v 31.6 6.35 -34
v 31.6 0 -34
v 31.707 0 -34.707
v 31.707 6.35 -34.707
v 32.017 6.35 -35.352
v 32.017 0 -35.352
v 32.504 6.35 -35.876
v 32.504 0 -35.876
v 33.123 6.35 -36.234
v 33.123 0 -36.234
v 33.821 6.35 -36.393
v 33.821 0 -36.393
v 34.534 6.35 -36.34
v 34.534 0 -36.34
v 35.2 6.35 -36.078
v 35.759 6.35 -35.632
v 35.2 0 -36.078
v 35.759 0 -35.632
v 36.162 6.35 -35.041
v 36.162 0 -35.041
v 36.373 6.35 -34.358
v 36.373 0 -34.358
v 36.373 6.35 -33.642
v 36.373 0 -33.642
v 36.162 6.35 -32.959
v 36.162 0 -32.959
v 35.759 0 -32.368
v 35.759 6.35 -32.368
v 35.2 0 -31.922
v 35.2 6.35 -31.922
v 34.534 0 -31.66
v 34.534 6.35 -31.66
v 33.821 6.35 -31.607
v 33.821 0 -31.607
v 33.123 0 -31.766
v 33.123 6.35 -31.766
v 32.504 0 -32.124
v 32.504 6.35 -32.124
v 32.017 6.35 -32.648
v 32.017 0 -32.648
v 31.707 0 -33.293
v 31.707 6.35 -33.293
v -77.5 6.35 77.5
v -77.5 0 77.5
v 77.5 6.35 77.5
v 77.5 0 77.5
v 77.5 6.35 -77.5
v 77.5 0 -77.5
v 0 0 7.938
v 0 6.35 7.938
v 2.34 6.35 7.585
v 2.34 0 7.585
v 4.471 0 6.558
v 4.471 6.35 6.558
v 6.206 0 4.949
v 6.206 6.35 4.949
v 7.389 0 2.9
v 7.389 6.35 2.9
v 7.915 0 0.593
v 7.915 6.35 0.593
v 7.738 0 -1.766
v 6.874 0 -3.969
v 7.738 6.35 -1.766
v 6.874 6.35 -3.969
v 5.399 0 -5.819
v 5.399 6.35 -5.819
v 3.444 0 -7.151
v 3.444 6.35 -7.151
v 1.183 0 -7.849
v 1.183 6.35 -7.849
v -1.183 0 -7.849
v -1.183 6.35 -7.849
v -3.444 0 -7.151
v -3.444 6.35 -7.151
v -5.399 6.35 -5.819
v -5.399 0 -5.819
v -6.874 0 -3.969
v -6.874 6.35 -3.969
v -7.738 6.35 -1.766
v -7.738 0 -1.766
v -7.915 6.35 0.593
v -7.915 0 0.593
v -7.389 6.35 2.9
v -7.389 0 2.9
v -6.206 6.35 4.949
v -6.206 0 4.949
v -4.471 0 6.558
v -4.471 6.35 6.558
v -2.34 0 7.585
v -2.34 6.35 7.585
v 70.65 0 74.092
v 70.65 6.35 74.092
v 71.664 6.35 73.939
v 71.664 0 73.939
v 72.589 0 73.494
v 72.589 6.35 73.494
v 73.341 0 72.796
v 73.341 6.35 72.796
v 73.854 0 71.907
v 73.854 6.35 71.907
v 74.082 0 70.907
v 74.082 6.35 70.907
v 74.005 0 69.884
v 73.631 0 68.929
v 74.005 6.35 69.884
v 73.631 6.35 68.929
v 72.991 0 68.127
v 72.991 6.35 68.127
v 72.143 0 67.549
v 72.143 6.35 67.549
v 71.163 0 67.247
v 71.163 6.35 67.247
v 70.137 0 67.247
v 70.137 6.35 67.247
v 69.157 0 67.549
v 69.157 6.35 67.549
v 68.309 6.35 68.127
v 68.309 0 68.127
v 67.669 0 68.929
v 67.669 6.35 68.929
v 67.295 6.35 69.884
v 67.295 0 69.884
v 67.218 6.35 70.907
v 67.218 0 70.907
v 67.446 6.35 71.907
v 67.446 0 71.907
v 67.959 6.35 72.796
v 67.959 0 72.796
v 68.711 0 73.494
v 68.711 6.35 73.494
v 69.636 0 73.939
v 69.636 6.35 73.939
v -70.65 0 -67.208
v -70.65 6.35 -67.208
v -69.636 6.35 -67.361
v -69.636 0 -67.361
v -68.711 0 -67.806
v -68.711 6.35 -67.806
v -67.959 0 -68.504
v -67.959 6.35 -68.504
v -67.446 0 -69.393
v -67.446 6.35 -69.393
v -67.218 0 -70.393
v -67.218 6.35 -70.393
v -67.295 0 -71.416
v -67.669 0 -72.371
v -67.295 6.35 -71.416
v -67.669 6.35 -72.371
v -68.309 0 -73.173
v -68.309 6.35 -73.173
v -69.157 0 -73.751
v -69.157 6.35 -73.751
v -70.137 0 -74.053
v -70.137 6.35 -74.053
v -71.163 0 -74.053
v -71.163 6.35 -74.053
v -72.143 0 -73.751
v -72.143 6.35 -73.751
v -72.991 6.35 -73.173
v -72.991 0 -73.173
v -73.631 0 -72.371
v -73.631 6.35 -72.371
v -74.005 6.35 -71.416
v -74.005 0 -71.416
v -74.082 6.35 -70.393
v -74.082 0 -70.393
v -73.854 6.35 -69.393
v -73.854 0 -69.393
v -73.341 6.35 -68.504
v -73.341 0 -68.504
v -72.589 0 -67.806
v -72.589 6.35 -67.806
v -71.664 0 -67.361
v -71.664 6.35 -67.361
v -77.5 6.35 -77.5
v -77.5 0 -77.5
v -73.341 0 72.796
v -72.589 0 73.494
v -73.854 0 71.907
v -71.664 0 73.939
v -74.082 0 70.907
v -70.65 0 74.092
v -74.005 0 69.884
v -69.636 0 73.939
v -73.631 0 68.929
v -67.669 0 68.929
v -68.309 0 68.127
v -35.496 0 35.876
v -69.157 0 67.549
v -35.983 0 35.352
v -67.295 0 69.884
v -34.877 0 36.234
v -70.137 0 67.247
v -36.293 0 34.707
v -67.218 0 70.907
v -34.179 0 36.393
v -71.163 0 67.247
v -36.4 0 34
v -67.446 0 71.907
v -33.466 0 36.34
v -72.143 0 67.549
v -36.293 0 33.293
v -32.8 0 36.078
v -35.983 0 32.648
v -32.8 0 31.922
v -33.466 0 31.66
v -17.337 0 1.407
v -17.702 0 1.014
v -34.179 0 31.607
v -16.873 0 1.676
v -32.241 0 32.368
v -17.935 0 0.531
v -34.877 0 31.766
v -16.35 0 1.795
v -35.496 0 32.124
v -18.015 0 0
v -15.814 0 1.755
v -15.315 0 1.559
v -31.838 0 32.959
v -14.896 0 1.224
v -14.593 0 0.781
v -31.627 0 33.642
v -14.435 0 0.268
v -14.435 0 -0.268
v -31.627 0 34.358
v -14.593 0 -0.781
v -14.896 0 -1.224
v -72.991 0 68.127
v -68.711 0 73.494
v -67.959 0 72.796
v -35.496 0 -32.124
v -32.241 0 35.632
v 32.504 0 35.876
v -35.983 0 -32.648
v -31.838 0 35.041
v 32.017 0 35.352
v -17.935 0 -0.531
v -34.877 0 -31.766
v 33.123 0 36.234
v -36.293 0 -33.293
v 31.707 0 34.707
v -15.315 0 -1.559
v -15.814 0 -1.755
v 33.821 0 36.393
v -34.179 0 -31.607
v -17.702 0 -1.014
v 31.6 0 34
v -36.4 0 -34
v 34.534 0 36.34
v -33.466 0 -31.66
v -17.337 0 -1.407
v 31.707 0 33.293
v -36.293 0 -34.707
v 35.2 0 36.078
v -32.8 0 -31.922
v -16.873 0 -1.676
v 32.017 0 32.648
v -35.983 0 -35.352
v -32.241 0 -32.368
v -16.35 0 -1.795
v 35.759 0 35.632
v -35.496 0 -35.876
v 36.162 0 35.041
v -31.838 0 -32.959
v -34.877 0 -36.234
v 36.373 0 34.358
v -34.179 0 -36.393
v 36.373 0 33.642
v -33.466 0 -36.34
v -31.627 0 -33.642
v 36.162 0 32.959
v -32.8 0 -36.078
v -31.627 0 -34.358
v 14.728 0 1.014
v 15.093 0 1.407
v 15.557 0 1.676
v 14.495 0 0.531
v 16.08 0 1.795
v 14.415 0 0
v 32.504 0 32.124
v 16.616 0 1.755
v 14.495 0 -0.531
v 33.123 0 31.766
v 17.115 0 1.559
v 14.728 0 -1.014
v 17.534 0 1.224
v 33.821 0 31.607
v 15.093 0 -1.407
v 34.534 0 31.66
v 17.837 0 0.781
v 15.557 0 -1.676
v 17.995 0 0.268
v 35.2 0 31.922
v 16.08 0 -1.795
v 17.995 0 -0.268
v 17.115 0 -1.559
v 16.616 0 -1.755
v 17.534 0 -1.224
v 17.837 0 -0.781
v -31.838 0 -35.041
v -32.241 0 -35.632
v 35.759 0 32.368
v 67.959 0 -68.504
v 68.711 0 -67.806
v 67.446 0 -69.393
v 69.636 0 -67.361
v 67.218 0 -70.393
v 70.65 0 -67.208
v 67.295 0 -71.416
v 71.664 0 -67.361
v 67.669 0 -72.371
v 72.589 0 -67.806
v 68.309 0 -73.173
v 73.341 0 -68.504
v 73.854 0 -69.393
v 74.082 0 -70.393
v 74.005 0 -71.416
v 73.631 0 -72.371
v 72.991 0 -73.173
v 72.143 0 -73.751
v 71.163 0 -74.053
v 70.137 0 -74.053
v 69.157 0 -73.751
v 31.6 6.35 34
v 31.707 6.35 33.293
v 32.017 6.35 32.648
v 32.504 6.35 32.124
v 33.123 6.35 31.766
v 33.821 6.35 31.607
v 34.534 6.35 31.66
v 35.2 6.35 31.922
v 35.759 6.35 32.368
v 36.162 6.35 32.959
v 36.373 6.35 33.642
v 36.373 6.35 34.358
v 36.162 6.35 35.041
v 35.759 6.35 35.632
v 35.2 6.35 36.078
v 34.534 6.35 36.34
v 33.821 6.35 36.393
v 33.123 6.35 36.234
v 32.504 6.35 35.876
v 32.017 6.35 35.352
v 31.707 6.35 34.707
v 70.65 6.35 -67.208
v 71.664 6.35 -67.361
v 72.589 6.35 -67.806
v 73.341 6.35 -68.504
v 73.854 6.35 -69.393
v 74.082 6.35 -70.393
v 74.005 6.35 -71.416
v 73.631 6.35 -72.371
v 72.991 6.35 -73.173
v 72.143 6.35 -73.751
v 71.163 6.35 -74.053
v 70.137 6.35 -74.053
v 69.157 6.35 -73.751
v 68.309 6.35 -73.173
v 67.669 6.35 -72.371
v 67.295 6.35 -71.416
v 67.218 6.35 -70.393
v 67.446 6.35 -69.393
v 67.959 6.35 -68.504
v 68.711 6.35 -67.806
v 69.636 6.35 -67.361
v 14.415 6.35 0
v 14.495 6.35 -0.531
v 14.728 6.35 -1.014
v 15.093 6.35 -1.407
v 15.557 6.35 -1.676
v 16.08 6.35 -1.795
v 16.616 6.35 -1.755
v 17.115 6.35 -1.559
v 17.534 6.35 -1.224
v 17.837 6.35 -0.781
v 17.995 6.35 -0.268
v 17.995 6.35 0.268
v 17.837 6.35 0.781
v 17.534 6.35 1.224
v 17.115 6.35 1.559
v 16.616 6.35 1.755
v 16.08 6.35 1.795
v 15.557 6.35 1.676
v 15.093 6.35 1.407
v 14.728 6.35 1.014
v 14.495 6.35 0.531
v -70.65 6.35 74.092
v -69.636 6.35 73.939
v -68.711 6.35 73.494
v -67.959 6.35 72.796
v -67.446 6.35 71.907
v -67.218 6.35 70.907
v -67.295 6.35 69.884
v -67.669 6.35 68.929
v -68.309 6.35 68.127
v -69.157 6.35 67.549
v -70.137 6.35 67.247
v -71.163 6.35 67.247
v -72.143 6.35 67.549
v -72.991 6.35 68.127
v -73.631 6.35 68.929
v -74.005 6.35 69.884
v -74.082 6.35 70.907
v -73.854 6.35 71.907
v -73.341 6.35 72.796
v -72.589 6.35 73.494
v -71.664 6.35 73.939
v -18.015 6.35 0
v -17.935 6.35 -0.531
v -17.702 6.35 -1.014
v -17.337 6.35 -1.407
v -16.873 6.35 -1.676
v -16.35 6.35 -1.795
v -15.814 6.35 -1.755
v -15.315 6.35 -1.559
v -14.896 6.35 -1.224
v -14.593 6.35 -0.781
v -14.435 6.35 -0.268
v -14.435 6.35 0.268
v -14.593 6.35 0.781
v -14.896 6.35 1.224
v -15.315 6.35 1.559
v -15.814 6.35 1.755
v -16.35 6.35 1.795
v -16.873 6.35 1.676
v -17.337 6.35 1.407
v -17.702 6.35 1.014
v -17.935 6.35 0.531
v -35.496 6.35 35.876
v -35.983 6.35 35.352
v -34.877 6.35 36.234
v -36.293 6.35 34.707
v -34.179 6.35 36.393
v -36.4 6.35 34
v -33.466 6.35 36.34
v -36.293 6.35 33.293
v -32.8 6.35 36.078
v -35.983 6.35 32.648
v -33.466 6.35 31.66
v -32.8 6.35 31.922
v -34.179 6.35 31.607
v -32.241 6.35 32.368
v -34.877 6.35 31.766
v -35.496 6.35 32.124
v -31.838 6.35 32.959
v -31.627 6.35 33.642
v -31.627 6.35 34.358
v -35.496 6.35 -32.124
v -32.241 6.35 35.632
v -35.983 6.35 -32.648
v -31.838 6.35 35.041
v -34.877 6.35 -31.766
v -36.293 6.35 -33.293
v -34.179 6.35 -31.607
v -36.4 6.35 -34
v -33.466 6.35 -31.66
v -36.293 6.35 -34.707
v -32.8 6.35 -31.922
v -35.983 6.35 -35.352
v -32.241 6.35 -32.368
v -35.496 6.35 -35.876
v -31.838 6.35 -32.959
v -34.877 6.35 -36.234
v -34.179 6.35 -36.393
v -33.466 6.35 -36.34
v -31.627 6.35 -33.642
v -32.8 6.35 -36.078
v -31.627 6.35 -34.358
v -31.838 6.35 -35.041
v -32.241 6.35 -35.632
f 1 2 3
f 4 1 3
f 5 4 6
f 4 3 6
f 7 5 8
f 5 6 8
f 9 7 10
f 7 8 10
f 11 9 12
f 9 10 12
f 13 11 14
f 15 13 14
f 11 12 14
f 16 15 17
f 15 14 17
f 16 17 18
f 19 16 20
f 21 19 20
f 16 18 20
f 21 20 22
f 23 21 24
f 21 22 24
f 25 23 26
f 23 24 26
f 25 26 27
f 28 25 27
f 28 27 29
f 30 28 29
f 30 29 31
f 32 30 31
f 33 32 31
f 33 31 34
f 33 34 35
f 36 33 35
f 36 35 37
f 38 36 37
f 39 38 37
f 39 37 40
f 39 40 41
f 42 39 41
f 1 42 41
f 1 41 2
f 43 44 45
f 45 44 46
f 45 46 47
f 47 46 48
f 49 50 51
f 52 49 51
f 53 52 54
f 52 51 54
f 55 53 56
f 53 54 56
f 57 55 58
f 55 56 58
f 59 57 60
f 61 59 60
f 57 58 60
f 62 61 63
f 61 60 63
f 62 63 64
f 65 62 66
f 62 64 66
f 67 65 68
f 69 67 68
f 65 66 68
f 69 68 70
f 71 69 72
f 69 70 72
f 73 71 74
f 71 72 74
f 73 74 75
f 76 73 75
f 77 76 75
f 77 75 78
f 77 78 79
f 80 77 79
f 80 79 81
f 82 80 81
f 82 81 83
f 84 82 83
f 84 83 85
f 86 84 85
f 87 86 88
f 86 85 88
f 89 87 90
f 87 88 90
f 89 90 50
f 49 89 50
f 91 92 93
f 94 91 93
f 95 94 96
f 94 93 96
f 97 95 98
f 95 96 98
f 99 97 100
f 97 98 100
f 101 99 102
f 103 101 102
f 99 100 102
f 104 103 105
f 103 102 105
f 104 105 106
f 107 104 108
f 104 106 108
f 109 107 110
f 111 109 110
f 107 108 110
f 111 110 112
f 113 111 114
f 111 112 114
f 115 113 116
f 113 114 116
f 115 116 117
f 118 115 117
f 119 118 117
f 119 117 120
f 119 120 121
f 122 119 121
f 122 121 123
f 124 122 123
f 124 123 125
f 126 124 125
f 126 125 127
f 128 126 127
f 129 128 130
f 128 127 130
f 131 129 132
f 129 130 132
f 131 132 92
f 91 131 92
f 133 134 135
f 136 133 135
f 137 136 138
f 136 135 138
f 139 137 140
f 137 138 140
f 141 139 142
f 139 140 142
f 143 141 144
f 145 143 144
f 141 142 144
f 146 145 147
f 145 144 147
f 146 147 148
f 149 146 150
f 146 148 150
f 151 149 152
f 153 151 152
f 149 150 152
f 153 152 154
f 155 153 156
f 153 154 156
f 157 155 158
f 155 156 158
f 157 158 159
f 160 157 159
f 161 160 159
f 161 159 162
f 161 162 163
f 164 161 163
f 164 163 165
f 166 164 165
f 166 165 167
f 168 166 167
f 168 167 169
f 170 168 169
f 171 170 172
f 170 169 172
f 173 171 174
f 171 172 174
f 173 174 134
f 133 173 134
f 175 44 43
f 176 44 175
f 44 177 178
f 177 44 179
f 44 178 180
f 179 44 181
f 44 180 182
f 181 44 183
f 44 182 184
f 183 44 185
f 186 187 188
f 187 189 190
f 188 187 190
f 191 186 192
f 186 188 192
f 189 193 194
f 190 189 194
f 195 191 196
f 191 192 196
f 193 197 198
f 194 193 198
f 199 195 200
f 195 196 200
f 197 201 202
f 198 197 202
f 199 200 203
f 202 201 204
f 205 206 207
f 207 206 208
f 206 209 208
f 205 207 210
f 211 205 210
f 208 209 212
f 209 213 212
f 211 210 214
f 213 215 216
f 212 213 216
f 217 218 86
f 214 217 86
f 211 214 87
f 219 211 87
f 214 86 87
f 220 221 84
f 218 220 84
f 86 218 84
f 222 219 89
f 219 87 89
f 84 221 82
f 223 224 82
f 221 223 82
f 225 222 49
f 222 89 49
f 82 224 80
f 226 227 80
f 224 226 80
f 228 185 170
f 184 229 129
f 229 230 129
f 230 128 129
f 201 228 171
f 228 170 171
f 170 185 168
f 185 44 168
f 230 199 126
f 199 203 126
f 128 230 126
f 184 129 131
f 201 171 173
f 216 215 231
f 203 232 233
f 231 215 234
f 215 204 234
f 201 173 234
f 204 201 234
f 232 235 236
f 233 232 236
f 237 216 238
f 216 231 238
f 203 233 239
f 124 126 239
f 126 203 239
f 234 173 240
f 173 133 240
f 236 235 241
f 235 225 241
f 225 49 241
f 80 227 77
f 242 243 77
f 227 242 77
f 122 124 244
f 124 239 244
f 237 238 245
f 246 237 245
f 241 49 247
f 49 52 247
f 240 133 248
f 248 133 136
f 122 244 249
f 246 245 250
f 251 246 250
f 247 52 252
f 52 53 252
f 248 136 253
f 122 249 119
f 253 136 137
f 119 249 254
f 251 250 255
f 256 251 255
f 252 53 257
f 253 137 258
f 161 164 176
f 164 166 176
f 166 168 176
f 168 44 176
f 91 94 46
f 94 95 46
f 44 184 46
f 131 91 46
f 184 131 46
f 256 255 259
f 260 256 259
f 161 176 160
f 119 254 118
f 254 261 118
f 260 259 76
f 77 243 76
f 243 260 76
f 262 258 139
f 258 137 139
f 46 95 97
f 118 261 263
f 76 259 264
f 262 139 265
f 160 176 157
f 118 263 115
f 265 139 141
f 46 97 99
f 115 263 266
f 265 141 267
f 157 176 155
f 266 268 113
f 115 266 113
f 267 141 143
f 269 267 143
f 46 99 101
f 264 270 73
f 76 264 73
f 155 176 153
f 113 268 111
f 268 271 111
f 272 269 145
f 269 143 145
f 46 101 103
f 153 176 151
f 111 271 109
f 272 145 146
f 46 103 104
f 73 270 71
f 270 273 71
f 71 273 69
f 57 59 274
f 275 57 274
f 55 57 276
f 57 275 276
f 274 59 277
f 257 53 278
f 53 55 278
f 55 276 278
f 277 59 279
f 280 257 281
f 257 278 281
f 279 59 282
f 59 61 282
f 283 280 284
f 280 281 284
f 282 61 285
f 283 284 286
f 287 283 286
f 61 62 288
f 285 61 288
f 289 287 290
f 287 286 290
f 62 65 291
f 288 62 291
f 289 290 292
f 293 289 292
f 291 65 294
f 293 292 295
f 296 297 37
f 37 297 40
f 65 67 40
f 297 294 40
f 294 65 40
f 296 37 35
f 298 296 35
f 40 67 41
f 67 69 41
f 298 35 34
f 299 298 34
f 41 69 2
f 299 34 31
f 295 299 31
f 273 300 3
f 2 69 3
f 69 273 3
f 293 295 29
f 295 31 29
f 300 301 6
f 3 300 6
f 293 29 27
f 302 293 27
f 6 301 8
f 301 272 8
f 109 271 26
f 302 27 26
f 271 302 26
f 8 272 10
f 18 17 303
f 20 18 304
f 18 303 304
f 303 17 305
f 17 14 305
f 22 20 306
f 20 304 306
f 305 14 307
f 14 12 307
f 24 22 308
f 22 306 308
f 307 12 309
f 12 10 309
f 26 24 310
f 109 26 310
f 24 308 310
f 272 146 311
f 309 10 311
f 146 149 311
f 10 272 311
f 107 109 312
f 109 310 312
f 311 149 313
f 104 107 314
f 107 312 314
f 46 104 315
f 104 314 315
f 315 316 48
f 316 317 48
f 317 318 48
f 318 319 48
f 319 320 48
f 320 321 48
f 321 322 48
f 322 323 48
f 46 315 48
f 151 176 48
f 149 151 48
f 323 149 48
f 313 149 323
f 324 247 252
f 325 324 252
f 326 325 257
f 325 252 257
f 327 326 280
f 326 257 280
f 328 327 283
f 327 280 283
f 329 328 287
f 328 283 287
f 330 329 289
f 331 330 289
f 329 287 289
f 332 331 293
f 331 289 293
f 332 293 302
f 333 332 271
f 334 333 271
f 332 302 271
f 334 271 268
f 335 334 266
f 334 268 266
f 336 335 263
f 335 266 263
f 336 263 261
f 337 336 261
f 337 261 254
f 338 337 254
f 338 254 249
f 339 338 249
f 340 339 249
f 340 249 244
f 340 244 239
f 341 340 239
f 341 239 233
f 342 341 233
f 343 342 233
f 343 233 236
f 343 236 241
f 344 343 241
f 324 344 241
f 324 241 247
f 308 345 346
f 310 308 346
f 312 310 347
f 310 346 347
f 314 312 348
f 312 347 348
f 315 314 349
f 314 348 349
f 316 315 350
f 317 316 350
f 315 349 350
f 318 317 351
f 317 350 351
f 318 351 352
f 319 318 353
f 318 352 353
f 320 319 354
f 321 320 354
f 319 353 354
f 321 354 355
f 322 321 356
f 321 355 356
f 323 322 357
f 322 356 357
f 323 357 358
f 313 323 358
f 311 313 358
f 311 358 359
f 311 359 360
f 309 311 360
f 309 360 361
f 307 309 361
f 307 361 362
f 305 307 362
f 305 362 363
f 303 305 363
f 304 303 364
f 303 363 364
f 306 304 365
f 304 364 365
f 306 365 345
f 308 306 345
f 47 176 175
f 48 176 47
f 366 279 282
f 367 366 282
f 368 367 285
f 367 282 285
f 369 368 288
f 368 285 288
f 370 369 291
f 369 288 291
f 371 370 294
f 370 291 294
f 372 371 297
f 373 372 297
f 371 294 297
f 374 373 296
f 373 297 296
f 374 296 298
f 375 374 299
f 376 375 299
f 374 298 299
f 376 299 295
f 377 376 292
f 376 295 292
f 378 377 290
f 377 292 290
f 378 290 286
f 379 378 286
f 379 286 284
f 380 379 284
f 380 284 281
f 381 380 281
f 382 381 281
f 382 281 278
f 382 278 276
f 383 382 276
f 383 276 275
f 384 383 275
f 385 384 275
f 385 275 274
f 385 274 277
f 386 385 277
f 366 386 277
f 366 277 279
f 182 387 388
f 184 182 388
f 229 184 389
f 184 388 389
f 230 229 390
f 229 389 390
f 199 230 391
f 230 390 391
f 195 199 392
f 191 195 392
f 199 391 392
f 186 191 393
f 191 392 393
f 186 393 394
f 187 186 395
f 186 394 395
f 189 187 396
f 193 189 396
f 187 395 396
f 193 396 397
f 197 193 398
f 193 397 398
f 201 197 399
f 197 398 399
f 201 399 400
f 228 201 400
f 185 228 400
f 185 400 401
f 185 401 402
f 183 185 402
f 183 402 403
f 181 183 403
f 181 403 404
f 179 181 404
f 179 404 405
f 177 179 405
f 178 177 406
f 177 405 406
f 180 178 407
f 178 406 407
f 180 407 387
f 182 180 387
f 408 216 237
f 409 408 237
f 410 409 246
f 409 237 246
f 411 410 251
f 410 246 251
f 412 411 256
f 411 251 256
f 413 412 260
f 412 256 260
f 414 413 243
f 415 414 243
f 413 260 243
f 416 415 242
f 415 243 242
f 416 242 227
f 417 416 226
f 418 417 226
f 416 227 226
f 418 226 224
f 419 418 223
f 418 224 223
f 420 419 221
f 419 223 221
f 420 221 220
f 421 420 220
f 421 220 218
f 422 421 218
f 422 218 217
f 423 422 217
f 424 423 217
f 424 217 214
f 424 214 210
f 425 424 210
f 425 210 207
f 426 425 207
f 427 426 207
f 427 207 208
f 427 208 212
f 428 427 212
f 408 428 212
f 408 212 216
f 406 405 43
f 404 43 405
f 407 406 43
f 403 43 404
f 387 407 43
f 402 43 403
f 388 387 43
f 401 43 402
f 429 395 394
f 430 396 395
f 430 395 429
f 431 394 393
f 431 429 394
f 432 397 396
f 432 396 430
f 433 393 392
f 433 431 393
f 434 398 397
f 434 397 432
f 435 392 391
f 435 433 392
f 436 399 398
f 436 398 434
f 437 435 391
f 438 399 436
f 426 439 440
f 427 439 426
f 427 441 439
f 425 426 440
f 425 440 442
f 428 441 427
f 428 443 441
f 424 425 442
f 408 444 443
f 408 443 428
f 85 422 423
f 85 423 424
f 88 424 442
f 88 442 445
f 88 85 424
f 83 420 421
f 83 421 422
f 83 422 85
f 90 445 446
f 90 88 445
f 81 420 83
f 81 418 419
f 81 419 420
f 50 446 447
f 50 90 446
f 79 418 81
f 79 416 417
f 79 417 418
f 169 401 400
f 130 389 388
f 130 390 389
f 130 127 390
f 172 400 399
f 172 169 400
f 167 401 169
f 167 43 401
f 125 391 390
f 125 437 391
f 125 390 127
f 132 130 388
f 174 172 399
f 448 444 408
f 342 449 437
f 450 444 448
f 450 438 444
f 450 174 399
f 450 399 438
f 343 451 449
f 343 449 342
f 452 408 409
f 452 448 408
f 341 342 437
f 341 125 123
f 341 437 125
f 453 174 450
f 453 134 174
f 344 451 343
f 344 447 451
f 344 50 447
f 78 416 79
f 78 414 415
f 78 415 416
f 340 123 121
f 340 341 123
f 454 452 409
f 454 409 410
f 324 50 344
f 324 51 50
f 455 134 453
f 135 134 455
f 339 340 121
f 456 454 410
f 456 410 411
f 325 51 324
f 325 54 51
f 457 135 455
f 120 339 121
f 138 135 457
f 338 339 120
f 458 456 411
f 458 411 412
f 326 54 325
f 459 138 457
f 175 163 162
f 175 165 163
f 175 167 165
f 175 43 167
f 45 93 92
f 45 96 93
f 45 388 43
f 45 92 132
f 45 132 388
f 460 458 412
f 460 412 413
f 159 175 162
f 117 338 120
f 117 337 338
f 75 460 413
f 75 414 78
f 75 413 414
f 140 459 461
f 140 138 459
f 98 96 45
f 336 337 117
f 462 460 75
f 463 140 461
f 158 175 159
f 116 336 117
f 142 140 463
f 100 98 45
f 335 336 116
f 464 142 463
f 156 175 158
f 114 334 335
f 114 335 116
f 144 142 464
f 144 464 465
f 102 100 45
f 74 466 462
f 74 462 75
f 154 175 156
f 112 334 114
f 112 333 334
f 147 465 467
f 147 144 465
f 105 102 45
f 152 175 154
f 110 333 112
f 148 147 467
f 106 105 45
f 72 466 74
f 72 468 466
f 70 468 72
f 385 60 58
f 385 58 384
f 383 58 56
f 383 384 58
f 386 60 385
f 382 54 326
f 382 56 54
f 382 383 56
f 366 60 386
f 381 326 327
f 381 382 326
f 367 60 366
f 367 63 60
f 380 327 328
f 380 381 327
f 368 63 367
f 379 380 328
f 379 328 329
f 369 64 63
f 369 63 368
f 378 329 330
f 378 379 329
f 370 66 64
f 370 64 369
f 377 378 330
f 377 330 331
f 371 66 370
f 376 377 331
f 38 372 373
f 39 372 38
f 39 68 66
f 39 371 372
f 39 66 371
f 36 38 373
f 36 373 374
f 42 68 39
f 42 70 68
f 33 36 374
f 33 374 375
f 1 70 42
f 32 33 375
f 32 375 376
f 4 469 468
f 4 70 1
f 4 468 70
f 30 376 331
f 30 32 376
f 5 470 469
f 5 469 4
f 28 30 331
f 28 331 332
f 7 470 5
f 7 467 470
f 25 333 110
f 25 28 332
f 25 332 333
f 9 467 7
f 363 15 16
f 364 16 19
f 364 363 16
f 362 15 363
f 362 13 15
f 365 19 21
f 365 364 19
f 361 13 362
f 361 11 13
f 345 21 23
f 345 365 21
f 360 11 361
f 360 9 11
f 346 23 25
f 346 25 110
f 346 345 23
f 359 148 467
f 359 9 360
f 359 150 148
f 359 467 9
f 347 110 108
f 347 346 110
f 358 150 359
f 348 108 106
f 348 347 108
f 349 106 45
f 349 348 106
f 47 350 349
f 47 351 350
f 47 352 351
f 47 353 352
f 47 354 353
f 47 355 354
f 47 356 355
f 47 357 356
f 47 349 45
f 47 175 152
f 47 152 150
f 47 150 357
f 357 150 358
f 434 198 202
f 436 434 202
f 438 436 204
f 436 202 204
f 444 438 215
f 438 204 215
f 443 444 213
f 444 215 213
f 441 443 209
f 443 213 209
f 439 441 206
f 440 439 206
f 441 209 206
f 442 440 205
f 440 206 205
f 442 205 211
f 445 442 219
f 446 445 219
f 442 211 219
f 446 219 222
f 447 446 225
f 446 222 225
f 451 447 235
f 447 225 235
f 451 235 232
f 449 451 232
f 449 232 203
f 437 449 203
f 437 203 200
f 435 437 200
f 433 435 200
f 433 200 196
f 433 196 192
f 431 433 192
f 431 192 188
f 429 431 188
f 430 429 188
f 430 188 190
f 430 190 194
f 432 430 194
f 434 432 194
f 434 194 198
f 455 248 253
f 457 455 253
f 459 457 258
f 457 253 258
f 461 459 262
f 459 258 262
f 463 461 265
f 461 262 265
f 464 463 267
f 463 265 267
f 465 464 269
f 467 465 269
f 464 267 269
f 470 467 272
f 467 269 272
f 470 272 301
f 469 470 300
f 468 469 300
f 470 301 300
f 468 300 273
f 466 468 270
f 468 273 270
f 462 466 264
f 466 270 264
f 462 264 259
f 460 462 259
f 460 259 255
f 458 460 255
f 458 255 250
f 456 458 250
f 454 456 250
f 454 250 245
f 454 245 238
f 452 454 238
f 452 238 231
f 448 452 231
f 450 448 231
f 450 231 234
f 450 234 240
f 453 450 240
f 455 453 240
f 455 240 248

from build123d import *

# Parameters (mm, degrees)
ESQUISSE1_W                   = 155
ESQUISSE1_H                   = 155
BOSS_EXTRU_1_DEPTH            = 6.35
ESQUISSE3_R                   = 3.4417
LAZY_SUSAN_BOLT_PATTERN_DEPTH = 6.35
ESQUISSE4_R                   = 7.9375
ENL_V_MAT_EXTRU_2_DEPTH       = 6.35
D_GAGEMENT_M41_D              = 4.8
D_GAGEMENT_M31_D              = 3.6


with BuildPart() as part:
    # Esquisse1 → Boss.-Extru.1 (new body)
    with BuildSketch(Plane(origin=(0, 0, 0), x_dir=(1, 0, 0), z_dir=(0, 1, 0))):
        Rectangle(ESQUISSE1_W, ESQUISSE1_H)
    extrude(amount=BOSS_EXTRU_1_DEPTH)

    # Esquisse3 → lazy_susan_bolt_pattern (cut)
    with BuildSketch(Plane(origin=(0, 6.35, 0), x_dir=(1, 0, 0), z_dir=(0, 1, 0))):
        with Locations(Location((-70.65, 70.65, 0), (0, 0, 270))):
            Circle(ESQUISSE3_R)
        with Locations(Location((70.65, 70.65, 0), (0, 0, 270))):
            Circle(ESQUISSE3_R)
        with Locations(Location((70.65, -70.65, 0), (0, 0, 270))):
            Circle(ESQUISSE3_R)
        with Locations(Location((-70.65, -70.65, 0), (0, 0, 270))):
            Circle(ESQUISSE3_R)
    extrude(amount=-LAZY_SUSAN_BOLT_PATTERN_DEPTH, mode=Mode.SUBTRACT)

    # Esquisse4 → Enlèv. mat.-Extru.2 (cut)
    with BuildSketch(Plane(origin=(0, 6.35, 0), x_dir=(1, 0, 0), z_dir=(0, 1, 0))):
        with Locations(Location((0, 0, 0), (0, 0, 270))):
            Circle(ESQUISSE4_R)
    extrude(amount=-ENL_V_MAT_EXTRU_2_DEPTH, mode=Mode.SUBTRACT)

    # Dégagement M41 (through all)
    with Locations(Plane(origin=(0, 6.35, 0), x_dir=(1, 0, 0), z_dir=(0, 1, 0))):
        with Locations((-34, 34), (34, 34), (34, -34), (-34, -34)):
            Hole(D_GAGEMENT_M41_D / 2)

    # Dégagement M31 (through all)
    with Locations(Plane(origin=(0, 6.35, 0), x_dir=(1, 0, 0), z_dir=(0, 1, 0))):
        with Locations((16.215, 0), (-16.215, 0)):
            Hole(D_GAGEMENT_M31_D / 2)


solid = part.part
